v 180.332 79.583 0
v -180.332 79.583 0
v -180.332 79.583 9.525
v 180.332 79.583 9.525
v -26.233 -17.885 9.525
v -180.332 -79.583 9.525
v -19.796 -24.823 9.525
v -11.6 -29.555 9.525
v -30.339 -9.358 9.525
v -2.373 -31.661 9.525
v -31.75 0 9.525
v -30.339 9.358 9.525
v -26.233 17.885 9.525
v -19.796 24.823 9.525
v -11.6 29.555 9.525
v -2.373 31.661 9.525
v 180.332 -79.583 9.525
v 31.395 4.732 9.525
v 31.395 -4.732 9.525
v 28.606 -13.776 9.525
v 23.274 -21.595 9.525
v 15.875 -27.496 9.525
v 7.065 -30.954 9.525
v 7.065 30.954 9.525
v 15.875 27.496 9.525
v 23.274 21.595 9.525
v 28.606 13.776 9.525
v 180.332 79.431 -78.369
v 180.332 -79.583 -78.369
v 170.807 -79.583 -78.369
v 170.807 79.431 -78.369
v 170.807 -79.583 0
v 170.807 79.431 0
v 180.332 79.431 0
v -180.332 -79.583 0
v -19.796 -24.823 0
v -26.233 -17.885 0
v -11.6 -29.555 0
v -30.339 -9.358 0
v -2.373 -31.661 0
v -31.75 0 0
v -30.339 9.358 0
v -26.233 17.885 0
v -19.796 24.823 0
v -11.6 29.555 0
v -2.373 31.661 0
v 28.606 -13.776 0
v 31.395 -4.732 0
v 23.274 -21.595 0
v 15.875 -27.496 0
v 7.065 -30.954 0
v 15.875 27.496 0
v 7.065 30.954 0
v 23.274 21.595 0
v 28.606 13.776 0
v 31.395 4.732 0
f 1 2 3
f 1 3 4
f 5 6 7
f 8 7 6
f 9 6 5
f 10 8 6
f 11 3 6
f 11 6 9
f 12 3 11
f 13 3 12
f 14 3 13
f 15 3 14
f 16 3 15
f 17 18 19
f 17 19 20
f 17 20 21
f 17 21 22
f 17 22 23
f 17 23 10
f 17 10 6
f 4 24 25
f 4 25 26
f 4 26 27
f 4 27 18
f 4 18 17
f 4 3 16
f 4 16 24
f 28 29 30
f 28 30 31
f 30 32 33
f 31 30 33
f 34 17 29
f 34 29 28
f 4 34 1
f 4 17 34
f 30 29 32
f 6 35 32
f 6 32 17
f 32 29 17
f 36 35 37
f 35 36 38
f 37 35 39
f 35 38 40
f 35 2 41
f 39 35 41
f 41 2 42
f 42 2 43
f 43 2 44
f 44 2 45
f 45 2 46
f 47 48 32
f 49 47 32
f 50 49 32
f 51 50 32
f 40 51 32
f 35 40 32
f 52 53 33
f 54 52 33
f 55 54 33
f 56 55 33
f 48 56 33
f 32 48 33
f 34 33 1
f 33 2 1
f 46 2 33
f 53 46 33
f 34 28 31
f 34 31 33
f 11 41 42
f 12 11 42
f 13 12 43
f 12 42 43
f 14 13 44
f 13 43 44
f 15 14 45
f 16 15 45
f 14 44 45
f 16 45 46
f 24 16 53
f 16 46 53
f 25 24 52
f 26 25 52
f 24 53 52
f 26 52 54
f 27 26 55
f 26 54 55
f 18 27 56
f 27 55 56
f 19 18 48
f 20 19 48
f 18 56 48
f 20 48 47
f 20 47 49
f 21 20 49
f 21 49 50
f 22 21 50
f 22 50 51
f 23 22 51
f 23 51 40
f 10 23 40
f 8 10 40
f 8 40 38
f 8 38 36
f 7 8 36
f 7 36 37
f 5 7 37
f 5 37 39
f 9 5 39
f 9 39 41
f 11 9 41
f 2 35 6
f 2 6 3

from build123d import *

# Parameters (mm, degrees)
F0_W     = 360.6640398502
F0_H     = 159.1658816382
F1_DEPTH = 9.525
F3_D     = 63.5
F4_W     = 159.013863685
F4_H     = 78.3692672849
F5_DEPTH = 9.525


with BuildPart() as f1:
    # F0 (on Top) → F1 (new body)
    with BuildSketch(Plane.XY):
        Rectangle(F0_W, F0_H)
    extrude(amount=F1_DEPTH)

    # F3 (through all)
    with Locations(Plane.XY.offset(9.525)):
        with Locations((0, 0)):
            Hole(F3_D / 2)

    # F4 (on face) → F5 (join)
    with BuildSketch(Plane.YZ.offset(180.3320199251)):
        with Locations((-0.0760089766, -39.1846336424)):
            Rectangle(F4_W, F4_H)
    extrude(amount=-F5_DEPTH)


solid = f1.part
